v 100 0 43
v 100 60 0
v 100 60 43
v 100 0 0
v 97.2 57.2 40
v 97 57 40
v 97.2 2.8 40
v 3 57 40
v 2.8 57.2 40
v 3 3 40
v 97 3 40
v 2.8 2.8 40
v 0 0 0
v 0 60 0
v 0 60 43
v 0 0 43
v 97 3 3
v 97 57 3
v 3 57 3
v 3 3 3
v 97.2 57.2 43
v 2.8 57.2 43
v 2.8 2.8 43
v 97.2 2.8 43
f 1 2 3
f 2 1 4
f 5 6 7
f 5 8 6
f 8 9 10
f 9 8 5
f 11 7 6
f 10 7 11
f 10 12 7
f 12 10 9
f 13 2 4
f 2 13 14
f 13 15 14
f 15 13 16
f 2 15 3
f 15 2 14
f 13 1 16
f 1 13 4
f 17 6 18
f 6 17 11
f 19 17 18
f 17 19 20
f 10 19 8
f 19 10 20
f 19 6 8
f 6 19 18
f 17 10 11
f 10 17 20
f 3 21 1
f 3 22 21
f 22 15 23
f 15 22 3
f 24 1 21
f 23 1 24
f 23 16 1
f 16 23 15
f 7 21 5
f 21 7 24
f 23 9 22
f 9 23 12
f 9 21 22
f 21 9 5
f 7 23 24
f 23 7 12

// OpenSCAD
// Parámetros
ancho = 100;
profundidad = 60;
altura = 40;
espesor = 3;
tolerancia = 0.2; // Pequeño espacio para encaje

// Caja
module caja() {
    difference() {
        cube([ancho, profundidad, altura]);
        translate([espesor, espesor, espesor]) 
            cube([ancho - 2*espesor, profundidad - 2*espesor, altura]);
    }
}

// Tapa con encaje
module tapa() {
    translate([0, 0, altura]) {
        difference() {
            cube([ancho, profundidad, espesor]);
            translate([espesor - tolerancia, espesor - tolerancia, -1]) 
                cube([ancho - 2*espesor + 2*tolerancia, profundidad - 2*espesor + 2*tolerancia, espesor + 2]);
        }
    }
}

// Ensamblaje
caja();
tapa();
